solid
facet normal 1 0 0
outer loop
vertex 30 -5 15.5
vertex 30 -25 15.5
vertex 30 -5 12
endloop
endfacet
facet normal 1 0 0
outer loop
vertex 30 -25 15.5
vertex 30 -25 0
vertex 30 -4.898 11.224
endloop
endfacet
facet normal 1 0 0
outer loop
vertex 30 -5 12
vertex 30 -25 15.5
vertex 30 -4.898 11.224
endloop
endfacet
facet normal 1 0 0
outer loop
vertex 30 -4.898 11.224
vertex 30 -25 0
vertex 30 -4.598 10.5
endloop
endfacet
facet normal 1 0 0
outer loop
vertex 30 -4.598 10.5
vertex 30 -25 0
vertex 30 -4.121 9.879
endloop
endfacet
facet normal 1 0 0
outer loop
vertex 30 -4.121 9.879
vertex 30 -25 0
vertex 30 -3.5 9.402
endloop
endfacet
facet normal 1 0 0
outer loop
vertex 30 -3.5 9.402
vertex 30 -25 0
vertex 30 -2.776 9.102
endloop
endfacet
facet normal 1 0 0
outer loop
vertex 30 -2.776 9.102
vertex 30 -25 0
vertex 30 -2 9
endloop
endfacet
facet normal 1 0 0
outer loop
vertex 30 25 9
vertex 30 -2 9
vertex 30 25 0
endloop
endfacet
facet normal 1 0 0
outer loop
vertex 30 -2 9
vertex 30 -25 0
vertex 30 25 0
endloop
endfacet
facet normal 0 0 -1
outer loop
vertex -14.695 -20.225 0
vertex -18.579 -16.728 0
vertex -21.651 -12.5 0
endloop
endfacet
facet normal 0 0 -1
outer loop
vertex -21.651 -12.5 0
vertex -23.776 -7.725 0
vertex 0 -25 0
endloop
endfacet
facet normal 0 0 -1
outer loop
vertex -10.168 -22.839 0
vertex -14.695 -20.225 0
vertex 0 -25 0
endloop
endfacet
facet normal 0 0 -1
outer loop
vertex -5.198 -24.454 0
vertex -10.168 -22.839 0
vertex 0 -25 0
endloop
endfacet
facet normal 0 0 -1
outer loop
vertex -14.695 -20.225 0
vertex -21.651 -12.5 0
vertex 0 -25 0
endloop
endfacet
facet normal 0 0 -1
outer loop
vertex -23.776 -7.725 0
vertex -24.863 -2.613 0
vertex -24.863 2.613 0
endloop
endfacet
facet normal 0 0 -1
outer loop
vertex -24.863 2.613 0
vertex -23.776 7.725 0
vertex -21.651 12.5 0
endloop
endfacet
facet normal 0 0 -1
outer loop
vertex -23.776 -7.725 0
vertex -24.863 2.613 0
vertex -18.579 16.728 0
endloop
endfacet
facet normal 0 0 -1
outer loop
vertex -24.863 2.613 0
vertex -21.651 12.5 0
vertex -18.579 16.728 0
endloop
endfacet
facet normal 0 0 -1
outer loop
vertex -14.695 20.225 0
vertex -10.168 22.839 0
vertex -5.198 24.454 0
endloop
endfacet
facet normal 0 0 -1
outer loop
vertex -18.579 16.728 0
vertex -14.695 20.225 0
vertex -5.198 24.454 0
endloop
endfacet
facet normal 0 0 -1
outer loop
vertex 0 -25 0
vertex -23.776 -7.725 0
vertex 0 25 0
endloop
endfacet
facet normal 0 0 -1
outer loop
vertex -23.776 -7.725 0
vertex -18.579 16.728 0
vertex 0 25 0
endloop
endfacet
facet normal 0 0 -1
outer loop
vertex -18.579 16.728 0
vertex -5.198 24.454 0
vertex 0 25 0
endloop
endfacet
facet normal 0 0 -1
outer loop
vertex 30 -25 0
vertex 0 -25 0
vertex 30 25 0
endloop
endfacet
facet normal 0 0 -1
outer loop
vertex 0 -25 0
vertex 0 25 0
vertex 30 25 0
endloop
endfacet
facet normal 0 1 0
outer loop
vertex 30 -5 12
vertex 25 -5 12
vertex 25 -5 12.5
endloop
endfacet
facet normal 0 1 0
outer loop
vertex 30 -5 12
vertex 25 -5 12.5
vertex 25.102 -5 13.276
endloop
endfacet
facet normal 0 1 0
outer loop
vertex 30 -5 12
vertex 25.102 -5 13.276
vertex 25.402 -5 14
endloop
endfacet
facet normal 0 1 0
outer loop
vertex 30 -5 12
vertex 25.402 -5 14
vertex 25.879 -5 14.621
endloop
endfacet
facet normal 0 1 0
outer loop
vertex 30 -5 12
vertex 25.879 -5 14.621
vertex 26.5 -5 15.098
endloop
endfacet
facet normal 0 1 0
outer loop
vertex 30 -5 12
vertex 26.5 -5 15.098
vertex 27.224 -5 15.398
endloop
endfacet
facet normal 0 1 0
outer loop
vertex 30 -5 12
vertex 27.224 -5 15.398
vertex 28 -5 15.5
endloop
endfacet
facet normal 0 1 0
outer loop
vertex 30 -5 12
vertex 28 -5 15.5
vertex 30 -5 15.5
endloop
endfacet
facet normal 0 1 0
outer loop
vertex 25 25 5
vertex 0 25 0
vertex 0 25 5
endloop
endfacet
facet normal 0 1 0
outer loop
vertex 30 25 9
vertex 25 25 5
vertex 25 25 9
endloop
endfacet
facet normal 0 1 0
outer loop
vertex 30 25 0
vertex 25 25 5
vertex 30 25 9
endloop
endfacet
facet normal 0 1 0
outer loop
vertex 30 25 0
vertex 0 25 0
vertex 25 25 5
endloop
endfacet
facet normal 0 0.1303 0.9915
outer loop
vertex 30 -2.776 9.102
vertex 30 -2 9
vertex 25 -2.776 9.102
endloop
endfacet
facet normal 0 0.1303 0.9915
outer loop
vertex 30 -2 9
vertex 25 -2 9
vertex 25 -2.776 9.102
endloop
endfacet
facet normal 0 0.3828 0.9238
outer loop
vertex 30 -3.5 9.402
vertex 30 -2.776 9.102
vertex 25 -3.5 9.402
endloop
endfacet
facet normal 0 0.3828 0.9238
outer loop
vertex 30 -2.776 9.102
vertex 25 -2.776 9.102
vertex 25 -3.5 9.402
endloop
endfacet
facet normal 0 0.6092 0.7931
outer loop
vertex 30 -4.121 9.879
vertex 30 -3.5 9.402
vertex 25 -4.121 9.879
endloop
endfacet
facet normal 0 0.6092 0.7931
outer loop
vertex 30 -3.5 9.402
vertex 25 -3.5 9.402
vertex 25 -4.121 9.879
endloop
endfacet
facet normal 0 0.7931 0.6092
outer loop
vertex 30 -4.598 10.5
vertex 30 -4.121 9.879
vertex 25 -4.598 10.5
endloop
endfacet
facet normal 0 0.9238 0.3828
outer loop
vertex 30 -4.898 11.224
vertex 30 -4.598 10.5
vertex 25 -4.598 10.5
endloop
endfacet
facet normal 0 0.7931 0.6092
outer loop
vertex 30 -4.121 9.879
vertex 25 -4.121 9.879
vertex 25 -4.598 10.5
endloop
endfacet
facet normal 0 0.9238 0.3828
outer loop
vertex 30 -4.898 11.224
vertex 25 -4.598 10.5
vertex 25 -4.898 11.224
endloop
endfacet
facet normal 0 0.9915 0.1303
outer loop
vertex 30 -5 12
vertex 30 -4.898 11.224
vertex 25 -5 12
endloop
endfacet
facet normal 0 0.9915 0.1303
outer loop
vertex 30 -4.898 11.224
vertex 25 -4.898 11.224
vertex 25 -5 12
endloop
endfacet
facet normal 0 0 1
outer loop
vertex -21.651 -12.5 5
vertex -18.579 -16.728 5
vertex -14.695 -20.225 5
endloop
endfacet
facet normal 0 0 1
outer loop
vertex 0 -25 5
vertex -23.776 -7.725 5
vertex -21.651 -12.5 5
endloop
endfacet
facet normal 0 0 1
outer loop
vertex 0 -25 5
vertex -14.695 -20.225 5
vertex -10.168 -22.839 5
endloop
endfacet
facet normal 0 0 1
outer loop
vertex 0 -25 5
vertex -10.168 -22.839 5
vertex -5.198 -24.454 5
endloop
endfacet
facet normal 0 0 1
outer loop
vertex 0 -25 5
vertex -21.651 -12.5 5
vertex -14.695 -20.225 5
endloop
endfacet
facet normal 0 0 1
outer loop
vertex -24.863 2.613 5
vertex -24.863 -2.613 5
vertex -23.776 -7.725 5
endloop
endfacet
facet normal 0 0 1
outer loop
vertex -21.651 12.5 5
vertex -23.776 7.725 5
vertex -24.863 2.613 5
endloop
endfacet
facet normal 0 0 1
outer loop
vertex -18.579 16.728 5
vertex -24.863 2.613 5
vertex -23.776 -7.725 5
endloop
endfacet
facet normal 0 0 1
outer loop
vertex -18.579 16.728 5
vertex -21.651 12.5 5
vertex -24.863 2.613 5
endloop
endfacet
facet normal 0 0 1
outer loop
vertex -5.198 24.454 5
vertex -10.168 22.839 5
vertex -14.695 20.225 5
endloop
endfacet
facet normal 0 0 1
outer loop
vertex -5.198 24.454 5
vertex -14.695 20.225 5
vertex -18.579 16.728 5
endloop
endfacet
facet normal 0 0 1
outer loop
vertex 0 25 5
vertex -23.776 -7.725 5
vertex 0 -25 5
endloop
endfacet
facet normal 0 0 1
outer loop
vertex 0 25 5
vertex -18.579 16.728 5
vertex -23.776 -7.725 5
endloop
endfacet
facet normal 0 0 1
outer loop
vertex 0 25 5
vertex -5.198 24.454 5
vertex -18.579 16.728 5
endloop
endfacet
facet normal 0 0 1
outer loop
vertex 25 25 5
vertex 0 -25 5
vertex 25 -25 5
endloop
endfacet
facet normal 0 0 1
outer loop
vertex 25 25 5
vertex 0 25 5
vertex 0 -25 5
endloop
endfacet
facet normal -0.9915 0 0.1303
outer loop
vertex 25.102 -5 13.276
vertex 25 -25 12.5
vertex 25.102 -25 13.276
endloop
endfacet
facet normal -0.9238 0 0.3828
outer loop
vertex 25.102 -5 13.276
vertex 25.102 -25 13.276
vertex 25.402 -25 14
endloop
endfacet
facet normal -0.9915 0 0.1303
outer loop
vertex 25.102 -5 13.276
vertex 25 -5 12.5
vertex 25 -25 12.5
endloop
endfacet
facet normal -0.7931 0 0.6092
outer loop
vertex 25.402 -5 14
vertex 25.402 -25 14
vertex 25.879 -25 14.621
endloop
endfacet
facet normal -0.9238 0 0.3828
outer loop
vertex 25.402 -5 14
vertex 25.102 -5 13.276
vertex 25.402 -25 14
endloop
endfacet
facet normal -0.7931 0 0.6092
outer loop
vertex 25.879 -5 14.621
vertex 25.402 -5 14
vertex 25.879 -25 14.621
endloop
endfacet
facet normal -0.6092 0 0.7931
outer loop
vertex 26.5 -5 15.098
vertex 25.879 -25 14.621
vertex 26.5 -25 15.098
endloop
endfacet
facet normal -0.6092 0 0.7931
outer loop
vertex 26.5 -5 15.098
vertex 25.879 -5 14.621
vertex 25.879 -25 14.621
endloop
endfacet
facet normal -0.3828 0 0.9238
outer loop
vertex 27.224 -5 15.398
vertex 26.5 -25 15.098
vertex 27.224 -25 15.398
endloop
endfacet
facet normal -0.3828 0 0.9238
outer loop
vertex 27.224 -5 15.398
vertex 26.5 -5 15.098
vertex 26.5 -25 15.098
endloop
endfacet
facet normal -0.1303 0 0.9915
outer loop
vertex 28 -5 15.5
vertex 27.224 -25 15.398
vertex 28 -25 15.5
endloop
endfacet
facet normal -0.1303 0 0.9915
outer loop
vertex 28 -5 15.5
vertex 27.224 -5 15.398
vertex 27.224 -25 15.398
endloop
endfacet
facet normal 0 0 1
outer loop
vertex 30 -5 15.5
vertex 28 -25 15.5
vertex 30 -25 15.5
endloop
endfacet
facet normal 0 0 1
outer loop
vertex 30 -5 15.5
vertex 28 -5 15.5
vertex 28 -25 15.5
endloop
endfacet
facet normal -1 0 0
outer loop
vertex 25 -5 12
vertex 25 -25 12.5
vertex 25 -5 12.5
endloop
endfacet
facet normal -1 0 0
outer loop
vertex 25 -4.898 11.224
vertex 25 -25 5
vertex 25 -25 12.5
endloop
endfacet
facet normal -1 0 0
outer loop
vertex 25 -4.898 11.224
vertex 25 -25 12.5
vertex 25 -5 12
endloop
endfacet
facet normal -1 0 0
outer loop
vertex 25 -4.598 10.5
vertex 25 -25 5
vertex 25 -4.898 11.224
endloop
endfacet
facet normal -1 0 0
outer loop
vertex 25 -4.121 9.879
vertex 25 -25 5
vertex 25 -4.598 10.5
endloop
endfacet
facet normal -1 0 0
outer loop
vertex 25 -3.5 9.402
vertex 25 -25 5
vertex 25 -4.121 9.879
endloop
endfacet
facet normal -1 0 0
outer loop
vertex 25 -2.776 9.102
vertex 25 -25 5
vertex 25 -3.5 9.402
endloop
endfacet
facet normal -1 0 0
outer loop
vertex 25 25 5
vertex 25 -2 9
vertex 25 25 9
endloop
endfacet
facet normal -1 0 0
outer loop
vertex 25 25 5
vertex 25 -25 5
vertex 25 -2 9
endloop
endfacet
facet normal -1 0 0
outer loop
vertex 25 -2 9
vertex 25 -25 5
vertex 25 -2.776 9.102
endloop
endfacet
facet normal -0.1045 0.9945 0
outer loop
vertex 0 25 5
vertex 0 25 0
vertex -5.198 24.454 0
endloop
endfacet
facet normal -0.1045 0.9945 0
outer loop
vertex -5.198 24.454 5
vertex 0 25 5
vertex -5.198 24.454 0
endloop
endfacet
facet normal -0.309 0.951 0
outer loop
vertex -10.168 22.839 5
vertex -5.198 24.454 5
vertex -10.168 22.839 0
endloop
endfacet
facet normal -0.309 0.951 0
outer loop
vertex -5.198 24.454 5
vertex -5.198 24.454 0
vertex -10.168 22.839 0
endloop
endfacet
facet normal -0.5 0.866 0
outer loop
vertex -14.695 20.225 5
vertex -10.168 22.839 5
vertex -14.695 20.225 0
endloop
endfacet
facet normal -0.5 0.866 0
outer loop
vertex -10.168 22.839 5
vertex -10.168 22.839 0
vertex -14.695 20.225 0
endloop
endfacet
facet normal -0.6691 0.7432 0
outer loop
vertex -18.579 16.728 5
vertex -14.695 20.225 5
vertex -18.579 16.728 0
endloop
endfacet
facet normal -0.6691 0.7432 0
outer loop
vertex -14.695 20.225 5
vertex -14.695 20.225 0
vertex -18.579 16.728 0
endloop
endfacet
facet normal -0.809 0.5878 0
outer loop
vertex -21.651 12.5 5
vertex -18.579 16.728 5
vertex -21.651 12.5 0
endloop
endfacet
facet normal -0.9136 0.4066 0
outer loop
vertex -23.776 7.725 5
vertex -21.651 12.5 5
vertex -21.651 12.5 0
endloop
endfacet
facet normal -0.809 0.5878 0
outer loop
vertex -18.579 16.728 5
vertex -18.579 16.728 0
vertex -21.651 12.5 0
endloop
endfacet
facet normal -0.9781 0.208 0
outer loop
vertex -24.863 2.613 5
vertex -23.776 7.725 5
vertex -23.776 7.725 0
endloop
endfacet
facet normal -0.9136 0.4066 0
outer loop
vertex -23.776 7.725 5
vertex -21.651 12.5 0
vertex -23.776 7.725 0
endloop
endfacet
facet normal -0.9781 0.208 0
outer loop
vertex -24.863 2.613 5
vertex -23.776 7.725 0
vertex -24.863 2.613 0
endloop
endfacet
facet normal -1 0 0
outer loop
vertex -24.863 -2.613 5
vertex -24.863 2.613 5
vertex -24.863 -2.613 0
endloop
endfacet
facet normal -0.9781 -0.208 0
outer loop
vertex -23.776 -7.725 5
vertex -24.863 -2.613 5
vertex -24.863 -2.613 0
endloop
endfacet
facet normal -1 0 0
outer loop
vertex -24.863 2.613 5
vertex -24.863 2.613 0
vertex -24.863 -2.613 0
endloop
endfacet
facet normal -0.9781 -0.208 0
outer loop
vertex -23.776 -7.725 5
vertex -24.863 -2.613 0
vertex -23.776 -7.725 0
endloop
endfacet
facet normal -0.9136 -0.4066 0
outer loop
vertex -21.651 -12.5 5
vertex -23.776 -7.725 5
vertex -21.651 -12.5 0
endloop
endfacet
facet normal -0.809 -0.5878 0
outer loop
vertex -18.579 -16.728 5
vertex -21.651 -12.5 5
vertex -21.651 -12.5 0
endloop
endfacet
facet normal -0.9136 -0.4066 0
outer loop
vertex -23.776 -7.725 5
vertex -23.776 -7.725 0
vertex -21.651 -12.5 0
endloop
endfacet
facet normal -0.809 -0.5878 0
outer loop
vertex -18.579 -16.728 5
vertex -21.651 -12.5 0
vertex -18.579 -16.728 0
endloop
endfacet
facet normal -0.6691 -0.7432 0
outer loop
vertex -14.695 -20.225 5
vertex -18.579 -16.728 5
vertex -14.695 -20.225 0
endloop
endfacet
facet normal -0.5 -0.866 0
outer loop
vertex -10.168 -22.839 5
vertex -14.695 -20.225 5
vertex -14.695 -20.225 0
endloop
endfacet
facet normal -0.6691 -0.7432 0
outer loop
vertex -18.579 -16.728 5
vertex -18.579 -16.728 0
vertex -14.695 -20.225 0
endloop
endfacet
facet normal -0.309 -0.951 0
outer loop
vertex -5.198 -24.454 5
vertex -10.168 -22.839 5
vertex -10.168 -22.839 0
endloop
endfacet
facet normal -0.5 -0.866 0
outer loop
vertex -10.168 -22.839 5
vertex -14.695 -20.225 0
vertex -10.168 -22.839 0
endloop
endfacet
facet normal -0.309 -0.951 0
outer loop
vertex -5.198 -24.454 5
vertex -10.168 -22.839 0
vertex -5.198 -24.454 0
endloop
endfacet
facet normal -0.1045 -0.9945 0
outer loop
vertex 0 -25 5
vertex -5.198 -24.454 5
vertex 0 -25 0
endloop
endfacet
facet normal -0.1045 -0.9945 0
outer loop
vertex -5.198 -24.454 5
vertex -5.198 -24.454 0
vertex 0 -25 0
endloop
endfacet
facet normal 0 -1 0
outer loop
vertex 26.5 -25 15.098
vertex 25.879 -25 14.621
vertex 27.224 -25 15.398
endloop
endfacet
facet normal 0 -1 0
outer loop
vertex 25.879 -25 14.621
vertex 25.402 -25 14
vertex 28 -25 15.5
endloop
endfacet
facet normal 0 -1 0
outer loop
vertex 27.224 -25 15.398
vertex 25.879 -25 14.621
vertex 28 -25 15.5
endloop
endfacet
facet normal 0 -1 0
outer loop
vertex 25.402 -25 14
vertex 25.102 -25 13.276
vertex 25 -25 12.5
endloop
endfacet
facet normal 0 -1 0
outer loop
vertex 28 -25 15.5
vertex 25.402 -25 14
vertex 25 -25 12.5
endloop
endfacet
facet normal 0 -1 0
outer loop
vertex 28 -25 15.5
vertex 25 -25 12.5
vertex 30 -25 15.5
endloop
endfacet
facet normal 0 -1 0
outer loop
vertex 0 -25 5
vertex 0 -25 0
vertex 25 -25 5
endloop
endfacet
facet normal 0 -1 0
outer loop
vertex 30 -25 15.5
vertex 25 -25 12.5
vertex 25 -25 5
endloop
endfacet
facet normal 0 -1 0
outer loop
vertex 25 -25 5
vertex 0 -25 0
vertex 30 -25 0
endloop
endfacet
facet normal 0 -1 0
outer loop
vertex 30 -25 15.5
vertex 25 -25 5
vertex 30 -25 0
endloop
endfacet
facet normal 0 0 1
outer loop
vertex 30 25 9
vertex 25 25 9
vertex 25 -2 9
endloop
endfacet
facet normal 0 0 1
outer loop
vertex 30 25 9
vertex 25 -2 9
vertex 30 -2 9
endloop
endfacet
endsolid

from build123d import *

# Parameters (mm, degrees)
F1_DEPTH = 5
F2_W     = 5
F2_H     = 50
F3_DEPTH = 4
F4_W     = 5
F4_H     = 20
F5_DEPTH = 10.5
F6_R     = 3


with BuildPart() as f1:
    # F0 (on Top) → F1 (new body)
    with BuildSketch(Plane.XY):
        with BuildLine():
            Line((30, 25), (0, 25))
            ThreePointArc((0, 25), (-25, 0), (0, -25))
            Line((0, -25), (30, -25))
            Line((30, -25), (30, 25))
        make_face()
    extrude(amount=F1_DEPTH)

    # F2 (on face) → F3 (join)
    with BuildSketch(Plane.XY.offset(5)):
        with Locations((27.5, 0)):
            Rectangle(F2_W, F2_H)
    extrude(amount=F3_DEPTH)

    # F4 (on face) → F5 (join)
    with BuildSketch(Plane.XY.offset(5)):
        with Locations((27.5, -15)):
            Rectangle(F4_W, F4_H)
    extrude(amount=F5_DEPTH)

    # F6
    f6_edges = [f1.edges().sort_by_distance(p)[0] for p in [
        (27.5, -5, 9),
        (25, -15, 15.5),
    ]]
    fillet(f6_edges, radius=F6_R)


solid = f1.part
